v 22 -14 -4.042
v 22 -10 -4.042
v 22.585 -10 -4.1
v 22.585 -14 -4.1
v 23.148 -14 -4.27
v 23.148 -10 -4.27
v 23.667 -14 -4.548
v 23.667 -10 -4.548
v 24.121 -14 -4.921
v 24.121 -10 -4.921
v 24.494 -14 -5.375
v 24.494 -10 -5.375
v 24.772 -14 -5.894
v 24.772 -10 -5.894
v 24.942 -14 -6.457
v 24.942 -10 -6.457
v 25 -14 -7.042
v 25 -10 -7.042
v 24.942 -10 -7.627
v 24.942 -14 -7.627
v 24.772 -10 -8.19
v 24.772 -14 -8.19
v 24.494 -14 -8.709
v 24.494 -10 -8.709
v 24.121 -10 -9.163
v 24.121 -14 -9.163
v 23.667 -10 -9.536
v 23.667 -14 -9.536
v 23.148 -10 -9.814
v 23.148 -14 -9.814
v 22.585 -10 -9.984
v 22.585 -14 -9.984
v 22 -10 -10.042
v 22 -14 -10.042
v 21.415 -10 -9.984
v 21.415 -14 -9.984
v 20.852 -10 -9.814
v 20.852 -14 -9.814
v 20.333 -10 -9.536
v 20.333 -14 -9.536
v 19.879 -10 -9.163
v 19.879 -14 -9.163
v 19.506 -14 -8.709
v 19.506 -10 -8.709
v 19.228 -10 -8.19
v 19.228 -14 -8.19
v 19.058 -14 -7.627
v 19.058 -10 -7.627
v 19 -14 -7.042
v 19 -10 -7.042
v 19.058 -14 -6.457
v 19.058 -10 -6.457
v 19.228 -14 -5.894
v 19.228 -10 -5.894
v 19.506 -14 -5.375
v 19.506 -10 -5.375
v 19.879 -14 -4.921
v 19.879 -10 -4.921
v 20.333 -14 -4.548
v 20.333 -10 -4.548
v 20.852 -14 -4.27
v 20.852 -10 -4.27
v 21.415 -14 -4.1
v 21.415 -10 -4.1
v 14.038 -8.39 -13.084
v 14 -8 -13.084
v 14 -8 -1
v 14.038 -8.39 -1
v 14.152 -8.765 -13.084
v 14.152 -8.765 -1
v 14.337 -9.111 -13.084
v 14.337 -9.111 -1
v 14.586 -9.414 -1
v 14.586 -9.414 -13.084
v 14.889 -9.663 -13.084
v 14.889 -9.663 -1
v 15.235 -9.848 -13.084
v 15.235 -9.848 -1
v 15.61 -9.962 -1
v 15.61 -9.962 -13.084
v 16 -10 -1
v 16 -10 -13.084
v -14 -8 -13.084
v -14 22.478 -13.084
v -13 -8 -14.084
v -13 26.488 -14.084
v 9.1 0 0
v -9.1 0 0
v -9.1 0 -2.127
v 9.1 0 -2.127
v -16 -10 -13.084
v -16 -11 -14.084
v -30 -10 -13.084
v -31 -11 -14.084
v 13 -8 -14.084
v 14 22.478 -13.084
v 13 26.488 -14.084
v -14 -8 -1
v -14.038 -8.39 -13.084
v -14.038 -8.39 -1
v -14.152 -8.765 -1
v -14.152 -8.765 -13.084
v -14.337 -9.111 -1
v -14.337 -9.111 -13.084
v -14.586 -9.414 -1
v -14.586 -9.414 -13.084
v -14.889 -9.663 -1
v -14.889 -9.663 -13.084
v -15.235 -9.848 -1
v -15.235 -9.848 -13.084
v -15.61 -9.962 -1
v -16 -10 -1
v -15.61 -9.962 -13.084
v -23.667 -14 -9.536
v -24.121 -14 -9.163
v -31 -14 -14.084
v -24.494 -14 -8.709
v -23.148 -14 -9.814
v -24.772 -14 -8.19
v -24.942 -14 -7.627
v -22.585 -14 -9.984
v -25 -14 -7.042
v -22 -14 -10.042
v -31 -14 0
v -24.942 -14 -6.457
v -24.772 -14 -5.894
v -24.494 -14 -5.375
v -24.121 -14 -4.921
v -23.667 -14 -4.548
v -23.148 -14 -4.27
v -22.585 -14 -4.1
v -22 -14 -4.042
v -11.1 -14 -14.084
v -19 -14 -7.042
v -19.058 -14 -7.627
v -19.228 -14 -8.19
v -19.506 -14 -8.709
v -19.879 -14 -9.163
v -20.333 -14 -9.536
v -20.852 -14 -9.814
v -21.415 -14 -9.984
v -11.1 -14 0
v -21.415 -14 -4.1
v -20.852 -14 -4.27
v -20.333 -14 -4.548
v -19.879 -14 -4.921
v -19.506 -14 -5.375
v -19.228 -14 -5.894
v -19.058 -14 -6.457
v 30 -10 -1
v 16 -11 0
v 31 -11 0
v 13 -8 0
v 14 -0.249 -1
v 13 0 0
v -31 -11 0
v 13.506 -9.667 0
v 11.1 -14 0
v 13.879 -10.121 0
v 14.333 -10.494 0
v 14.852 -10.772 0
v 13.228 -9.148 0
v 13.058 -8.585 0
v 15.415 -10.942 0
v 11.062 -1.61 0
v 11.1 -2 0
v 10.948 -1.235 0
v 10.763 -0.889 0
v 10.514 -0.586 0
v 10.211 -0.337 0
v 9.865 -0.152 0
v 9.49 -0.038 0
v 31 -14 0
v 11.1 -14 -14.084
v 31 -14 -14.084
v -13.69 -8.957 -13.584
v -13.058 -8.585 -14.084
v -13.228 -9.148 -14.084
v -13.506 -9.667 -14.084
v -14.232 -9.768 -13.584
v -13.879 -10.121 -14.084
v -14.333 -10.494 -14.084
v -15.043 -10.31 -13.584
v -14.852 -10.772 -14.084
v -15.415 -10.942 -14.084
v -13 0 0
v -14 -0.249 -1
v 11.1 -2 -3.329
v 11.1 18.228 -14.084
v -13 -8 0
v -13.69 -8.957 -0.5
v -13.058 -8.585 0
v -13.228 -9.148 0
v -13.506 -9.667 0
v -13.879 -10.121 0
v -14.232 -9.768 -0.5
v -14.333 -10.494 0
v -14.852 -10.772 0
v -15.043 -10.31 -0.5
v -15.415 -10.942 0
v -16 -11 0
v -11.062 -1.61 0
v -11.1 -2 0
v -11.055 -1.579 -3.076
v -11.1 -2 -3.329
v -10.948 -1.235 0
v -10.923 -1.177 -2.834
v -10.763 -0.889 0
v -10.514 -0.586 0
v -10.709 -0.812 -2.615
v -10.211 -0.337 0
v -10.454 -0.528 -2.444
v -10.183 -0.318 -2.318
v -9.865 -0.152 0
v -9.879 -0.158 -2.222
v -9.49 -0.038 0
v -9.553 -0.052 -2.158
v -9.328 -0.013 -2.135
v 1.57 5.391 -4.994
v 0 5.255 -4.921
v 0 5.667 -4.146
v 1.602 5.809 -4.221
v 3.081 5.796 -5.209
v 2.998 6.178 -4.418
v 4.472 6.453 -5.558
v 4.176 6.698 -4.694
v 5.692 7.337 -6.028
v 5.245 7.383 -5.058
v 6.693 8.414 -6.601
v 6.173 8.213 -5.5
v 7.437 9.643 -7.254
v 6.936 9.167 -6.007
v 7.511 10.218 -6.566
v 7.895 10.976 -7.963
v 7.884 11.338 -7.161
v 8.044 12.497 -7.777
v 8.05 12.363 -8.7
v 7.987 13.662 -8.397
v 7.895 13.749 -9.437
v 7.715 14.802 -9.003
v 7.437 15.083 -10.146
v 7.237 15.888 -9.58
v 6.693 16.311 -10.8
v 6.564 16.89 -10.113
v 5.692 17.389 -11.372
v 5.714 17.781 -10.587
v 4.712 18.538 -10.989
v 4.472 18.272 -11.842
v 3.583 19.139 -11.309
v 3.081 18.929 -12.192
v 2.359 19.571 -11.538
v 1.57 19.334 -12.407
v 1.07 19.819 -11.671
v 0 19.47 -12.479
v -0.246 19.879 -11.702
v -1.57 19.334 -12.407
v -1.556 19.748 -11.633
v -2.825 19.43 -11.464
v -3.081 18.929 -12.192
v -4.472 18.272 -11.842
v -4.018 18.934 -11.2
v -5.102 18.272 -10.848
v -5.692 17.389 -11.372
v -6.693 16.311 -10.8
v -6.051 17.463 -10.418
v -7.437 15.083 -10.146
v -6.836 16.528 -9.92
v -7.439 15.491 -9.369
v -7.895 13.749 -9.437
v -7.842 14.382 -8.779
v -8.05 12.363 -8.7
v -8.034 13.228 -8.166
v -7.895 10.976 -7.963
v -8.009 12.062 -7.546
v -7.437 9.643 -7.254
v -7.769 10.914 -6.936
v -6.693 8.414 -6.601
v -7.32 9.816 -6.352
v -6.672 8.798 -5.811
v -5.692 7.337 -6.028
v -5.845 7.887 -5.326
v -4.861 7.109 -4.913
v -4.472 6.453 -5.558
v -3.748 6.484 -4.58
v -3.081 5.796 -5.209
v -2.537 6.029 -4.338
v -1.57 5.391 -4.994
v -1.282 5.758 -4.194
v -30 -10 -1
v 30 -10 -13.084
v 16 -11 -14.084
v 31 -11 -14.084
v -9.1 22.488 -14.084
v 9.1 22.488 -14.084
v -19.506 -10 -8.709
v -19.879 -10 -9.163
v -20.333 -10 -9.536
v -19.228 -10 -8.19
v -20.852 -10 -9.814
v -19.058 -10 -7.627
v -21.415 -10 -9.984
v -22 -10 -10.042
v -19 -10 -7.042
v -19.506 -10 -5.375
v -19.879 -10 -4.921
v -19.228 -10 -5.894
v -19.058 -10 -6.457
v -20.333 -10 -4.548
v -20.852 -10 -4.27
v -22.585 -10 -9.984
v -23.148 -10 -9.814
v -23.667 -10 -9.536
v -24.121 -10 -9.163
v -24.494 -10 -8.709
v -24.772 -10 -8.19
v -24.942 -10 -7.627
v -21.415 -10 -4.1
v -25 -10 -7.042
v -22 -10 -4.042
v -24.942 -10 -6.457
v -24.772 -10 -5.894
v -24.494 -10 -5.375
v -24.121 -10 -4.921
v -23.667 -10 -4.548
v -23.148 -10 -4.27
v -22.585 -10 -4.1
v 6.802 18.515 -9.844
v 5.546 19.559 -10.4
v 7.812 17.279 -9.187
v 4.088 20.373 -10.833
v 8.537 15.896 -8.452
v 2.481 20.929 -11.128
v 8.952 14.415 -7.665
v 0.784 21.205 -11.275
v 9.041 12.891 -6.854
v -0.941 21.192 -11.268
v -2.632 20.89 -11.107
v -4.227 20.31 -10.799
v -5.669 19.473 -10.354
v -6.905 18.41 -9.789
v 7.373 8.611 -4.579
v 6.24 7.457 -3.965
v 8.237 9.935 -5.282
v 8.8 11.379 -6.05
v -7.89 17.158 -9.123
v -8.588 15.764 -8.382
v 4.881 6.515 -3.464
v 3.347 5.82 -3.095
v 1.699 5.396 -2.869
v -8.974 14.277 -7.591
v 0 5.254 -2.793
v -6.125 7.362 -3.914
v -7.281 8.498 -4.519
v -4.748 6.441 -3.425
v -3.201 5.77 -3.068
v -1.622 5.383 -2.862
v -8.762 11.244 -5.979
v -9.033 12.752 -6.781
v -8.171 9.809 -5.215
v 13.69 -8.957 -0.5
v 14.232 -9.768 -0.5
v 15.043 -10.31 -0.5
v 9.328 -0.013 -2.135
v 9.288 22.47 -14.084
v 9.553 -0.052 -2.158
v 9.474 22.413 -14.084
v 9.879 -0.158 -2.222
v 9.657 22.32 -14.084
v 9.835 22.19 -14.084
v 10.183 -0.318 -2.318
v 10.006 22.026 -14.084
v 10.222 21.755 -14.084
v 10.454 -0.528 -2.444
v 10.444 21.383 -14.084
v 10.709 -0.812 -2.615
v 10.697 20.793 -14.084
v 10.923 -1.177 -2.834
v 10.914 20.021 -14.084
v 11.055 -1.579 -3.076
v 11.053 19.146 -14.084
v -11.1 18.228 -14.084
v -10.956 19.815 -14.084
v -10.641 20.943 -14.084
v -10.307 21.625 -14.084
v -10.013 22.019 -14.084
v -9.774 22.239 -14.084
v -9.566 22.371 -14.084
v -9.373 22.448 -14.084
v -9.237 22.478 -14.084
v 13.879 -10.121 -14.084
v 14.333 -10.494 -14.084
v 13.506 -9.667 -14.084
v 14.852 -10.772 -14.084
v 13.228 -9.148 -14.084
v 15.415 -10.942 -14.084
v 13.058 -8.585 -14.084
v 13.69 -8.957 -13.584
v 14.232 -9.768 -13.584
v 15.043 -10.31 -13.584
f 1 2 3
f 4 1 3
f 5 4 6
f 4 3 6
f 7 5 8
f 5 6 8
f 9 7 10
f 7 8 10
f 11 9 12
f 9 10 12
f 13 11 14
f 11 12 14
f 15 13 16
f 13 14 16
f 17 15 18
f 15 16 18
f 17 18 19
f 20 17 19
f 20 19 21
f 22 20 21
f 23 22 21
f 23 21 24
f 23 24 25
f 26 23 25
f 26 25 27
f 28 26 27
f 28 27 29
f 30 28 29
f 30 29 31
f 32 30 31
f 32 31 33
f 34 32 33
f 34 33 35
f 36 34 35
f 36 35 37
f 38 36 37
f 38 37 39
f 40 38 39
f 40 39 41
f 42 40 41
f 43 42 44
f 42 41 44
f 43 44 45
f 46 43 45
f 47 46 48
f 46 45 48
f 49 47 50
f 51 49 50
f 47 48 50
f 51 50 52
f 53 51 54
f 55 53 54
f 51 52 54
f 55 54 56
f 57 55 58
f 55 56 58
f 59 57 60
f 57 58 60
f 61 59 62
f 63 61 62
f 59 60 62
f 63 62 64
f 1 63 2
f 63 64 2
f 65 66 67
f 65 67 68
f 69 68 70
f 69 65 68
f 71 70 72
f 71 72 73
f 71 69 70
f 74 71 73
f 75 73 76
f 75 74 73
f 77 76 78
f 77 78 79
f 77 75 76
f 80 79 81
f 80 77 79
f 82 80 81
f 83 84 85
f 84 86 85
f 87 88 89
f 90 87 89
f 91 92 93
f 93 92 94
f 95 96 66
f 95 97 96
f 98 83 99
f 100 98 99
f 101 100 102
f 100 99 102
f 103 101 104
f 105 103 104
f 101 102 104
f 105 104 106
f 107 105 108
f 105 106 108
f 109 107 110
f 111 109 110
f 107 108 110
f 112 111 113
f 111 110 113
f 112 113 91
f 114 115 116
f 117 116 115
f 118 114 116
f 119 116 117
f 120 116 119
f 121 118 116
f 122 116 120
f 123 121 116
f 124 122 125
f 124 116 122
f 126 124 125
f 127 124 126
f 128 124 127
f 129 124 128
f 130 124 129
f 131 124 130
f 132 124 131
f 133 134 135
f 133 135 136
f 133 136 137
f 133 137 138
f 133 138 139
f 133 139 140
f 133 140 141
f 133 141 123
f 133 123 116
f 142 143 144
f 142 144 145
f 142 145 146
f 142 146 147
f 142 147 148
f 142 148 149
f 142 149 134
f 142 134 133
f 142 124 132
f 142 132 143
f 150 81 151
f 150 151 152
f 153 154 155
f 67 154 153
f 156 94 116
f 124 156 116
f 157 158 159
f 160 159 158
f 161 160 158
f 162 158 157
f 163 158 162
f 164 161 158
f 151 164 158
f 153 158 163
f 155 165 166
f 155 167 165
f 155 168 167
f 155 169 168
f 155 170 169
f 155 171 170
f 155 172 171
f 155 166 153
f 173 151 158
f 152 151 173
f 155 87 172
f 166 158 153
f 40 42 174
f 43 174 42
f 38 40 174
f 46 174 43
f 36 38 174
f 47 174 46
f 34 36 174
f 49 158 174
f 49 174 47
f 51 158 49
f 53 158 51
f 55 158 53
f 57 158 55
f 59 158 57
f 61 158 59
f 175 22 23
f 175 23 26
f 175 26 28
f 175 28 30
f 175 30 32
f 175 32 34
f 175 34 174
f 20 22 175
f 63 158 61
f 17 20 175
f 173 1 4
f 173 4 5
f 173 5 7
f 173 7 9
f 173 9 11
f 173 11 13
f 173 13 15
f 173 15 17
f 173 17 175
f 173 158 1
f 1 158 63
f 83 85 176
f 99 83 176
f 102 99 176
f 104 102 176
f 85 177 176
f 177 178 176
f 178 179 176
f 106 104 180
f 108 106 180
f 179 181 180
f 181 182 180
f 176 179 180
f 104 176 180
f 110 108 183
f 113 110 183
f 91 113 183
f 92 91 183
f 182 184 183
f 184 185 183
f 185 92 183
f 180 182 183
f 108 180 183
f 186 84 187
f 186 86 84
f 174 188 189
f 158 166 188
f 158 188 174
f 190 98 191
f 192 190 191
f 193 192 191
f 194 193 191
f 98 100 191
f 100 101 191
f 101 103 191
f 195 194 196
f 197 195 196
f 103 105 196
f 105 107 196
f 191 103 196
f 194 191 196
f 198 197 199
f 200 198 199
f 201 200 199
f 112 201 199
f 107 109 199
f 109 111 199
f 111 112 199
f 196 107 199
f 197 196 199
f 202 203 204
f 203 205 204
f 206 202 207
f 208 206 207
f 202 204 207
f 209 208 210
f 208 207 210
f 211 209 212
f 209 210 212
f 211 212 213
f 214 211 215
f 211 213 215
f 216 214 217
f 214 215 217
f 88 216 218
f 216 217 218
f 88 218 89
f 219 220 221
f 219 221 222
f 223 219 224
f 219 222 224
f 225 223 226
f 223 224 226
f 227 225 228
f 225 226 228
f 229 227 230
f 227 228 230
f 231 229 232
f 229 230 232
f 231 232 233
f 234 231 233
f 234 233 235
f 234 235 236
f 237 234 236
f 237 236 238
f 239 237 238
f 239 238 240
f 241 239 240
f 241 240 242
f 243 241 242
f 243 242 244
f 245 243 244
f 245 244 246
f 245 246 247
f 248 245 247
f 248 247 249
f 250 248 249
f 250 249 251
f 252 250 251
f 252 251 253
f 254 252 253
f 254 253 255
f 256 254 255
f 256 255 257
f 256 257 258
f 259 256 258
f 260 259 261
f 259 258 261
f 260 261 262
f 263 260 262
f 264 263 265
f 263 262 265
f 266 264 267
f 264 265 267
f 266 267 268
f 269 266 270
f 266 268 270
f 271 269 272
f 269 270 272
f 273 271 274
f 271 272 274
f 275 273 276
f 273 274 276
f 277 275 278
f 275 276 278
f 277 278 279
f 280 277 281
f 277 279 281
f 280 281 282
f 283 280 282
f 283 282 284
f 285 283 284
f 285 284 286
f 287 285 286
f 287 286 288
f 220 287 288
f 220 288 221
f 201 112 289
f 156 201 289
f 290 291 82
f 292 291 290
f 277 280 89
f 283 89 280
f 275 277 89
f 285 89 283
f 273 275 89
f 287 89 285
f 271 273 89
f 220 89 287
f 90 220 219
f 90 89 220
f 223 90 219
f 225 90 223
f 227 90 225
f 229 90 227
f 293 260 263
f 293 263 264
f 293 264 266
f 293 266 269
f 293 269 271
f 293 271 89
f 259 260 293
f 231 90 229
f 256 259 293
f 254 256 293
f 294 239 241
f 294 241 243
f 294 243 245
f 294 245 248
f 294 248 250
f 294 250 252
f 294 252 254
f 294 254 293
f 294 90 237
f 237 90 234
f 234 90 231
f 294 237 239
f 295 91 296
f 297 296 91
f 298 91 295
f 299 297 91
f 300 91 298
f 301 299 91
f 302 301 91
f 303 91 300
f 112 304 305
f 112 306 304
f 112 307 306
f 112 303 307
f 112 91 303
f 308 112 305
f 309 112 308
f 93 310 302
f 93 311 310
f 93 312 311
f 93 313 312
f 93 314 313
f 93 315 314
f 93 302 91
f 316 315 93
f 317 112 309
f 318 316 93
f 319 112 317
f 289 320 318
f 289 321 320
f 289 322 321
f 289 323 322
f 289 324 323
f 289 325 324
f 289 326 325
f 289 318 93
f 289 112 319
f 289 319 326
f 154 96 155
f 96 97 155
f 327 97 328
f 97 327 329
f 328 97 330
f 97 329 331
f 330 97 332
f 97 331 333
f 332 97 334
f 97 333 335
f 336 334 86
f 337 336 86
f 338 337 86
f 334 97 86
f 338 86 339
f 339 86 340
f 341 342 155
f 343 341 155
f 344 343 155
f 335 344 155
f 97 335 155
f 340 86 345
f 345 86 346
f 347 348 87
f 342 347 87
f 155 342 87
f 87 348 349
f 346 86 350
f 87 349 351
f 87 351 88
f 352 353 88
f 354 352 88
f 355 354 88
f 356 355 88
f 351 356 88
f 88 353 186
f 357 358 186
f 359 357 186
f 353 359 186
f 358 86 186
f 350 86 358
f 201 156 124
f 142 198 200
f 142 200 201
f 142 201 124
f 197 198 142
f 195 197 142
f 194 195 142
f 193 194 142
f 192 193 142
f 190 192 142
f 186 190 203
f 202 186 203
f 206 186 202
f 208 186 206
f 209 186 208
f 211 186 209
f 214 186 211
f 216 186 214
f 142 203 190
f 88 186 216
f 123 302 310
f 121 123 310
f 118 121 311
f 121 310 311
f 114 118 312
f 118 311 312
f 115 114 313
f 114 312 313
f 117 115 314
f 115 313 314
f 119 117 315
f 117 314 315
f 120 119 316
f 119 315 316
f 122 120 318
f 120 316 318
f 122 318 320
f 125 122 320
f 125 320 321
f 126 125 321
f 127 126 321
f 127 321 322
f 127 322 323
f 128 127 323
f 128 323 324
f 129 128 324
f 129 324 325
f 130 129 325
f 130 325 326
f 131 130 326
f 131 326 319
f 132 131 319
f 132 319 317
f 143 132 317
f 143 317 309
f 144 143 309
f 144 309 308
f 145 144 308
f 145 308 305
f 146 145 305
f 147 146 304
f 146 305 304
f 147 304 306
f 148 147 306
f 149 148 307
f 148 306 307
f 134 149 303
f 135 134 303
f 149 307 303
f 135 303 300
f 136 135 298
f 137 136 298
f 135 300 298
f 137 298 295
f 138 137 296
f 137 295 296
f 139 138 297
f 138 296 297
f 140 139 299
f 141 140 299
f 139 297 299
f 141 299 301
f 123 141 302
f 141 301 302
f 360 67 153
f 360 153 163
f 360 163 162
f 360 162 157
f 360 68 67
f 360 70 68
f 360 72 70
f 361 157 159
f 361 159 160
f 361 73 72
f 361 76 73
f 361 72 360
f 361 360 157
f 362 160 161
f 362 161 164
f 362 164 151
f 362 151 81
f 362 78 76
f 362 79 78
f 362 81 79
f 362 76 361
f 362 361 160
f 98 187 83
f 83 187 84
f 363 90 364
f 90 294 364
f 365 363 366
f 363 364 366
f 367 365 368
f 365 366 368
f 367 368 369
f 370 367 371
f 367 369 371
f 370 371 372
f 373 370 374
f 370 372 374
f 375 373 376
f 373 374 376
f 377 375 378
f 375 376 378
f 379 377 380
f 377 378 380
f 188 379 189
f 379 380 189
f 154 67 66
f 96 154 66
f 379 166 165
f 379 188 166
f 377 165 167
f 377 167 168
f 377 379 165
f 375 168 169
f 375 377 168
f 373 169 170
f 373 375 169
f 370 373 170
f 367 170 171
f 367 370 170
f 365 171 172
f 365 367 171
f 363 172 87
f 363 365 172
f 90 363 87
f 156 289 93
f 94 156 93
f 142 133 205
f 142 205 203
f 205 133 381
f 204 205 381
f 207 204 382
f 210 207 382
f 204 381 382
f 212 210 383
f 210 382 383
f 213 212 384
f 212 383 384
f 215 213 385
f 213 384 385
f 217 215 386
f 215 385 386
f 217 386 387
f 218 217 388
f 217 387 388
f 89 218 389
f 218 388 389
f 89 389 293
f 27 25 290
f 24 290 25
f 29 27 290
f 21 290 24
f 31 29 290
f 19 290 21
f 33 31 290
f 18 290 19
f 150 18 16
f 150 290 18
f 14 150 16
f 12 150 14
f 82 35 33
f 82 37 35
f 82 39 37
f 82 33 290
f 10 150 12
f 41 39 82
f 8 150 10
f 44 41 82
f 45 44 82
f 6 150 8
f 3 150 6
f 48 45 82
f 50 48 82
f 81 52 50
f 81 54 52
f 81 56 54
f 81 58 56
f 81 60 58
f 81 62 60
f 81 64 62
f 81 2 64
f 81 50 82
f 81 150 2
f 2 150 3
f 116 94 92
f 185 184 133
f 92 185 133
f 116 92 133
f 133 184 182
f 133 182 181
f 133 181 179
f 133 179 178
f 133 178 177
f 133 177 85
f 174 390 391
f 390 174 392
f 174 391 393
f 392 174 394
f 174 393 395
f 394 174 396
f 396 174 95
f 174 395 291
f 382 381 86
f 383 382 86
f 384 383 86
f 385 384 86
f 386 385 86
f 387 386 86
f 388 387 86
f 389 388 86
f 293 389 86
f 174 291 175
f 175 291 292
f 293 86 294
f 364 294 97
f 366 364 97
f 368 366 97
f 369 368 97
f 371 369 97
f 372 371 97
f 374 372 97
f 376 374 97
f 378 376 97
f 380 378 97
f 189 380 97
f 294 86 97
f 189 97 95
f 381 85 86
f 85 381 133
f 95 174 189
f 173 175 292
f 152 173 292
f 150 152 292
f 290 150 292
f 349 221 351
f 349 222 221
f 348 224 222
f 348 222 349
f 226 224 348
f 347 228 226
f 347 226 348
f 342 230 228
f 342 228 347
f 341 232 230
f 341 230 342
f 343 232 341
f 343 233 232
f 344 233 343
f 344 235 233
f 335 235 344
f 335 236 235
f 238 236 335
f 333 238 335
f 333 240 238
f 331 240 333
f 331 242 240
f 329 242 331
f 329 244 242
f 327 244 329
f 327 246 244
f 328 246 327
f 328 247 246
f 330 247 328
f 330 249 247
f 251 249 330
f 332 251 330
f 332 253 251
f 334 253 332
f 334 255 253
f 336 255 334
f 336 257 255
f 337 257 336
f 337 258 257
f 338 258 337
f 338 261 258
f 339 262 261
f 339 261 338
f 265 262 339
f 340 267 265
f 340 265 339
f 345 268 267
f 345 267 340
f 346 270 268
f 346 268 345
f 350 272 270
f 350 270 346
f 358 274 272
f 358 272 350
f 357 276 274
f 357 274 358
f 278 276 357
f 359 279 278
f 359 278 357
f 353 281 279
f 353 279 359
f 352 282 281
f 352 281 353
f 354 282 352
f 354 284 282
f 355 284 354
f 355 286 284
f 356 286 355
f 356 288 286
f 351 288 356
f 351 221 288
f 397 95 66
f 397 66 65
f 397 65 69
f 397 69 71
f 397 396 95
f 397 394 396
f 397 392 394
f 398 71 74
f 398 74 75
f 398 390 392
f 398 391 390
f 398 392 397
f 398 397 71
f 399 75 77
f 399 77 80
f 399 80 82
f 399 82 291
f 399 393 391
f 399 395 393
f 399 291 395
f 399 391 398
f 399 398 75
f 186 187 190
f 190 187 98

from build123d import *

# Parameters (mm, degrees)
BOSS_EXTRUDE1_DEPTH      = 14
BOSS_EXTRUDE1_DEPTH_BACK = 14
BOSS_EXTRUDE3_DEPTH      = 14.084146884
CUT_EXTRUDE1_START       = 11.1
CUT_EXTRUDE1_DEPTH       = 22.2
SKETCH7_R                = 8.05
CUT_EXTRUDE2_DEPTH       = 3
SKETCH8_R                = 3
CUT_EXTRUDE4_DEPTH       = 50.90760018
FILLET4_R                = 2
CHAMFER6_SIZE            = 1


with BuildPart() as part:
    # Sketch1 → Boss-Extrude1 (new, two sides: drawn at the far end of the back side and taken through both)
    with BuildSketch(Plane(origin=(0, 0, 0), x_dir=(0, 0, -1), z_dir=(1, 0, 0)).offset(-BOSS_EXTRUDE1_DEPTH_BACK)):
        Polygon((0, 0), (14.084146884, 0), (14.084146884, 26.488427786), align=None)
    extrude(amount=BOSS_EXTRUDE1_DEPTH + BOSS_EXTRUDE1_DEPTH_BACK)

    # Sketch5 → Boss-Extrude3 (add)
    with BuildSketch(Plane.XY):
        Polygon((14, -10), (14, 0), (11.1, 0), (11.1, -14), (31, -14), (31, -10), align=None)
        Polygon((-14, 0), (-14, -10), (-31, -10), (-31, -14), (-11.1, -14), (-11.1, 0), align=None)
    extrude(amount=-BOSS_EXTRUDE3_DEPTH)

    # Sketch6 → Cut-Extrude1 (cut)
    with BuildSketch(Plane(origin=(0, 0, 0), x_dir=(0, 0, -1), z_dir=(1, 0, 0)).offset(CUT_EXTRUDE1_START)):
        Polygon((14.084146884, 0), (2.126837727, 0), (14.084146884, 22.488427786), align=None)
    extrude(amount=-CUT_EXTRUDE1_DEPTH, mode=Mode.SUBTRACT)

    # Sketch7 → Cut-Extrude2 (cut)
    with BuildSketch(Plane(origin=(0, 0, 0), x_dir=(1, 0, 0), z_dir=(0, 0.4694715627858856, 0.8829475928589298))):
        with Locations(Location((0, 15, 0), (0, 0, 270))):
            Circle(SKETCH7_R)
    extrude(amount=-CUT_EXTRUDE2_DEPTH, mode=Mode.SUBTRACT)

    # Sketch8 → Cut-Extrude4 (cut, through all)
    with BuildSketch(Plane(origin=(0, -10, 0), x_dir=(1, 0, 0), z_dir=(0, 1, 0))):
        with Locations(Location((22, 7.042073442, 0), (0, 0, 270))):
            Circle(SKETCH8_R)
        with Locations(Location((-22, 7.042073442, 0), (0, 0, 90))):
            Circle(SKETCH8_R)
    extrude(amount=-CUT_EXTRUDE4_DEPTH, mode=Mode.SUBTRACT)

    # Fillet4
    fillet4_edges = [part.edges().sort_by_distance(p)[0] for p in [
        (14, -10, -7.042073442),
        (-14, -10, -7.042073442),
        (-11.1, 0, -1.063418863),
        (11.1, 0, -1.063418863),
        (11.1, 11.244213893, -8.105492305),
        (-11.1, 11.244213893, -8.105492305),
    ]]
    fillet(fillet4_edges, radius=FILLET4_R)

    # Chamfer6
    chamfer6_edges = [part.edges().sort_by_distance(p)[0] for p in [
        (14, 13.244213893, -7.042073442),
        (14.585786438, -9.414213562, 0),
        (14.585786438, -9.414213562, -14.084146884),
        (-14.585786438, -9.414213562, 0),
        (-14.585786438, -9.414213562, -14.084146884),
        (31, -10, -7.042073442),
        (14, -4, 0),
        (-31, -10, -7.042073442),
        (-14, -4, 0),
        (-14, 13.244213893, -7.042073442),
        (0, 20.351942015, -10.821319522),
        (23.5, -10, -14.084146884),
        (23.5, -10, 0),
        (14, 13.244213893, -14.084146884),
        (-14, 13.244213893, -14.084146884),
        (-23.5, -10, -14.084146884),
        (-23.5, -10, 0),
    ]]
    chamfer(chamfer6_edges, length=CHAMFER6_SIZE)


solid = part.part
